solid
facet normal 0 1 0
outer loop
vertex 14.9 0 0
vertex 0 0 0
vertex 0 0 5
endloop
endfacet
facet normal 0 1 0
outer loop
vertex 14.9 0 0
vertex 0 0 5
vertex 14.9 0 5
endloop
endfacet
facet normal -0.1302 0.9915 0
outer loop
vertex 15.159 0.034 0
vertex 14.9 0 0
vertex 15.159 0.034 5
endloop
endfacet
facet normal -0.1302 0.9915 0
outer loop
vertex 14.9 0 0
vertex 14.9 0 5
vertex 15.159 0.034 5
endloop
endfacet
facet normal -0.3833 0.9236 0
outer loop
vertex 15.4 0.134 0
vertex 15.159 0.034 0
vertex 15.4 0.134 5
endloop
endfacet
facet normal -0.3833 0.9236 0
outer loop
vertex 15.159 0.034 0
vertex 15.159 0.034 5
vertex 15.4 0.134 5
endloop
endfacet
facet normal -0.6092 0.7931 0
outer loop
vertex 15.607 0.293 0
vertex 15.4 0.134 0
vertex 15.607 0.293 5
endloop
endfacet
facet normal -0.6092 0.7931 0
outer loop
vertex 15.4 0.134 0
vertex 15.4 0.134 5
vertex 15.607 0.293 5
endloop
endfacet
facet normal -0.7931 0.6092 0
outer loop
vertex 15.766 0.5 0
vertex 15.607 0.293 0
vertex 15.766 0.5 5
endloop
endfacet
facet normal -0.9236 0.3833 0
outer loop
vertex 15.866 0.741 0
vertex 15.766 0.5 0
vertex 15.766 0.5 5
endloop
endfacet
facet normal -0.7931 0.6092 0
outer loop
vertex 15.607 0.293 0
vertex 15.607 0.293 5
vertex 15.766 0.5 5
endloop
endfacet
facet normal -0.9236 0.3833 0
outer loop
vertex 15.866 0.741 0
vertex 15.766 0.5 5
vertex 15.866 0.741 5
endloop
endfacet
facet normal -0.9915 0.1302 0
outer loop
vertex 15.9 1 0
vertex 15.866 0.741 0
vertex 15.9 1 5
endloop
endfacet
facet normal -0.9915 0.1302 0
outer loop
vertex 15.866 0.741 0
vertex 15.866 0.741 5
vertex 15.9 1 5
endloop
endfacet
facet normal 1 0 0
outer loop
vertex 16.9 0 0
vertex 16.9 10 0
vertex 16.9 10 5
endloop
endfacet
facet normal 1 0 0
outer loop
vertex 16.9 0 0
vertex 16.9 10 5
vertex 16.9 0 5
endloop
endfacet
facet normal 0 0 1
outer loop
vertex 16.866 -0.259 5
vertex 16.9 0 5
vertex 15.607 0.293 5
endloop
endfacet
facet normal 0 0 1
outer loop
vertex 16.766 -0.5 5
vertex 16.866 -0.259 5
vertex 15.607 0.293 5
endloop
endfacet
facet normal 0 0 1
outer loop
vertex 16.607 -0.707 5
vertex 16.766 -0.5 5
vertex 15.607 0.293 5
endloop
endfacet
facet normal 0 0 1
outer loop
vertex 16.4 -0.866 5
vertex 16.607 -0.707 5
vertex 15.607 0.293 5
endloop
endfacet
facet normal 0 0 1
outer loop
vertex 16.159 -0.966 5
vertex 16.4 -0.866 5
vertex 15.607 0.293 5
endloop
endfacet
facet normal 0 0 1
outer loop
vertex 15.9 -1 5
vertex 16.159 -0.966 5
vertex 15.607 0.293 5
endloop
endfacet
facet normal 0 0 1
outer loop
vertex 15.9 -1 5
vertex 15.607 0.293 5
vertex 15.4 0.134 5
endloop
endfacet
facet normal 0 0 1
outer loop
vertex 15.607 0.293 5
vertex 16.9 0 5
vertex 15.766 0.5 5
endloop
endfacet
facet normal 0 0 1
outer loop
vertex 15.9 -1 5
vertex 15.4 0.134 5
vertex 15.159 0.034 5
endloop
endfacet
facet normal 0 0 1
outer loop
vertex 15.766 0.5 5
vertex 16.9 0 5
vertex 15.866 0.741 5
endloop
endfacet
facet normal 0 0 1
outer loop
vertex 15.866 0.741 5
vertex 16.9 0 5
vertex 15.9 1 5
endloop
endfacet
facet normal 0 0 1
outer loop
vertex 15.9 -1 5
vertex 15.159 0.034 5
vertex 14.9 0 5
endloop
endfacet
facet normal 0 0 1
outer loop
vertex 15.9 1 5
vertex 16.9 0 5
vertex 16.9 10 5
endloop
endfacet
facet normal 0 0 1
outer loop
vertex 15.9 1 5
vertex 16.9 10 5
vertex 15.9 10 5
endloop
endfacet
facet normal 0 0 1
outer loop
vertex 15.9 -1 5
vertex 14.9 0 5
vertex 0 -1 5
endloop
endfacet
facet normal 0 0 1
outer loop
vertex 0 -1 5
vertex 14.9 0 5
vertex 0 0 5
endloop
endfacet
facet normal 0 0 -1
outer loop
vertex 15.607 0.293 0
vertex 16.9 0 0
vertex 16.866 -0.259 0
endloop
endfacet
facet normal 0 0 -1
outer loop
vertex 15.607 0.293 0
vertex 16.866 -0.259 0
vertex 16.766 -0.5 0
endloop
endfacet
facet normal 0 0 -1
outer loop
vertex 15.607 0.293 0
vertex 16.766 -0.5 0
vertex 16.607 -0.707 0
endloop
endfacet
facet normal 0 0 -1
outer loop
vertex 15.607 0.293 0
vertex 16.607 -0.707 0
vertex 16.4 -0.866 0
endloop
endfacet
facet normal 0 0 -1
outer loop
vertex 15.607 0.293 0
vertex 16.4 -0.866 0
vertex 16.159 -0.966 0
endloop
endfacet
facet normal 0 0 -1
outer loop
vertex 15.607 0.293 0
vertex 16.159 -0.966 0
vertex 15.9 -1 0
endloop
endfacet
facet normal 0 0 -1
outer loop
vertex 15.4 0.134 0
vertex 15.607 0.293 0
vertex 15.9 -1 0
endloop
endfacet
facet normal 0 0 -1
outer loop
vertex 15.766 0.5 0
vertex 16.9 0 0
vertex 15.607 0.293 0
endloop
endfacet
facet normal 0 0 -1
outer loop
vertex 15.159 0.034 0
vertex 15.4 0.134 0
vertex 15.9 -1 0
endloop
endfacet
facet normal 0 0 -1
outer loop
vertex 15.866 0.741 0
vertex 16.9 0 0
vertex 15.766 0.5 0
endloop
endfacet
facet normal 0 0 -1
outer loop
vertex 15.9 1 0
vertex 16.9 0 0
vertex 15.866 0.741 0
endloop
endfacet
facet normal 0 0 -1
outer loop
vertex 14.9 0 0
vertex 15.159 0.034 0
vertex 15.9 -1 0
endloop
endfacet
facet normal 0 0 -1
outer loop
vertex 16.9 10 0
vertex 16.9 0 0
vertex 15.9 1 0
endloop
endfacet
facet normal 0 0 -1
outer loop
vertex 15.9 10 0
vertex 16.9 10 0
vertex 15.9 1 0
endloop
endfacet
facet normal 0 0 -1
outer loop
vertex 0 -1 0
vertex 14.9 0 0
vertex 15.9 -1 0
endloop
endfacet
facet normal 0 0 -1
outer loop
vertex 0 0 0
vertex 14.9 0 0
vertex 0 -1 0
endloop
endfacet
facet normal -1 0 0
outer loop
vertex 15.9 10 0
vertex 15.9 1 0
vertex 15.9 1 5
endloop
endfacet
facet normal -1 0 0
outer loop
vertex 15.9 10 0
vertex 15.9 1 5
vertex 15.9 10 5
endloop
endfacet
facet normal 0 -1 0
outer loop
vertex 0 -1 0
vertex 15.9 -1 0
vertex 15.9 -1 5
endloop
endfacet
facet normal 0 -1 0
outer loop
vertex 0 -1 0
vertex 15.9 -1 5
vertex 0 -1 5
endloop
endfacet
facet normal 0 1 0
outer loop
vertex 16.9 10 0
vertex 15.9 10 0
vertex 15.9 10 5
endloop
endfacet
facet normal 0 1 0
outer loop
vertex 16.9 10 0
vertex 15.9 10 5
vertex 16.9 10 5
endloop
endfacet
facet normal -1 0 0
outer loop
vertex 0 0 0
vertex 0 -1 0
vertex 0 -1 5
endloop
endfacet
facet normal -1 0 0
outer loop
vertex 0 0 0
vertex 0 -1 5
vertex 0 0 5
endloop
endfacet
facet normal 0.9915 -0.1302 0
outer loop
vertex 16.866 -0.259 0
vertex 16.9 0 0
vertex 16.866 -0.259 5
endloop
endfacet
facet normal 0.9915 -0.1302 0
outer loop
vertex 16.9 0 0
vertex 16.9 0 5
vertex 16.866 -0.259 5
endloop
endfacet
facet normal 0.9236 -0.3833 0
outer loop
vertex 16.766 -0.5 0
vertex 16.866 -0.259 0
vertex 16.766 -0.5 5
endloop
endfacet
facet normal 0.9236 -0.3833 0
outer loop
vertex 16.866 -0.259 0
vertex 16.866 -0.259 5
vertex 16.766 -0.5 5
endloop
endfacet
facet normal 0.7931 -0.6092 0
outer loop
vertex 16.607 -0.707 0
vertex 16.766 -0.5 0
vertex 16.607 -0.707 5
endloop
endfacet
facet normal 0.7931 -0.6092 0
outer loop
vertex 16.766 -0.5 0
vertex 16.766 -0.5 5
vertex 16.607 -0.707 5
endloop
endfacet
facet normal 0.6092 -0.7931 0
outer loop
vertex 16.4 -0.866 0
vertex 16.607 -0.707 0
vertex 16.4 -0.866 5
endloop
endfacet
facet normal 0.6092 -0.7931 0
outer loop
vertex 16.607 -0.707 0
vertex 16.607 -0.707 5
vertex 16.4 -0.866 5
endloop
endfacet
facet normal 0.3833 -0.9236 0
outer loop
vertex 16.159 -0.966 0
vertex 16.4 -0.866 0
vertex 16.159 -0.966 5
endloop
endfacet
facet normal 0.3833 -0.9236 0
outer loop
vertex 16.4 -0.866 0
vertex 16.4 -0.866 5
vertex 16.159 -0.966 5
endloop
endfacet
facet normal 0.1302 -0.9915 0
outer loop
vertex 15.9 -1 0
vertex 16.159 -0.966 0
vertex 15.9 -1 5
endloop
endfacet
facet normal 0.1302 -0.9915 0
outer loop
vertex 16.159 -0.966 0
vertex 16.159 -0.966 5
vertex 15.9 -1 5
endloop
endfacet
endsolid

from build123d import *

# Parameters (mm, degrees)
EXTRUDE_THIN1_DEPTH = 5
FILLET1_R           = 1


with BuildPart() as part:
    # Sketch1 → Extrude-Thin1 (new body)
    with BuildSketch(Plane.XY):
        Polygon((0, 0), (15.9, 0), (15.9, 10), (16.9, 10), (16.9, -1), (0, -1), align=None)
    extrude(amount=EXTRUDE_THIN1_DEPTH)

    # Fillet1
    fillet1_edges = [part.edges().sort_by_distance(p)[0] for p in [
        (16.9, -1, 2.5),
        (15.9, 0, 2.5),
    ]]
    fillet(fillet1_edges, radius=FILLET1_R)


solid = part.part
